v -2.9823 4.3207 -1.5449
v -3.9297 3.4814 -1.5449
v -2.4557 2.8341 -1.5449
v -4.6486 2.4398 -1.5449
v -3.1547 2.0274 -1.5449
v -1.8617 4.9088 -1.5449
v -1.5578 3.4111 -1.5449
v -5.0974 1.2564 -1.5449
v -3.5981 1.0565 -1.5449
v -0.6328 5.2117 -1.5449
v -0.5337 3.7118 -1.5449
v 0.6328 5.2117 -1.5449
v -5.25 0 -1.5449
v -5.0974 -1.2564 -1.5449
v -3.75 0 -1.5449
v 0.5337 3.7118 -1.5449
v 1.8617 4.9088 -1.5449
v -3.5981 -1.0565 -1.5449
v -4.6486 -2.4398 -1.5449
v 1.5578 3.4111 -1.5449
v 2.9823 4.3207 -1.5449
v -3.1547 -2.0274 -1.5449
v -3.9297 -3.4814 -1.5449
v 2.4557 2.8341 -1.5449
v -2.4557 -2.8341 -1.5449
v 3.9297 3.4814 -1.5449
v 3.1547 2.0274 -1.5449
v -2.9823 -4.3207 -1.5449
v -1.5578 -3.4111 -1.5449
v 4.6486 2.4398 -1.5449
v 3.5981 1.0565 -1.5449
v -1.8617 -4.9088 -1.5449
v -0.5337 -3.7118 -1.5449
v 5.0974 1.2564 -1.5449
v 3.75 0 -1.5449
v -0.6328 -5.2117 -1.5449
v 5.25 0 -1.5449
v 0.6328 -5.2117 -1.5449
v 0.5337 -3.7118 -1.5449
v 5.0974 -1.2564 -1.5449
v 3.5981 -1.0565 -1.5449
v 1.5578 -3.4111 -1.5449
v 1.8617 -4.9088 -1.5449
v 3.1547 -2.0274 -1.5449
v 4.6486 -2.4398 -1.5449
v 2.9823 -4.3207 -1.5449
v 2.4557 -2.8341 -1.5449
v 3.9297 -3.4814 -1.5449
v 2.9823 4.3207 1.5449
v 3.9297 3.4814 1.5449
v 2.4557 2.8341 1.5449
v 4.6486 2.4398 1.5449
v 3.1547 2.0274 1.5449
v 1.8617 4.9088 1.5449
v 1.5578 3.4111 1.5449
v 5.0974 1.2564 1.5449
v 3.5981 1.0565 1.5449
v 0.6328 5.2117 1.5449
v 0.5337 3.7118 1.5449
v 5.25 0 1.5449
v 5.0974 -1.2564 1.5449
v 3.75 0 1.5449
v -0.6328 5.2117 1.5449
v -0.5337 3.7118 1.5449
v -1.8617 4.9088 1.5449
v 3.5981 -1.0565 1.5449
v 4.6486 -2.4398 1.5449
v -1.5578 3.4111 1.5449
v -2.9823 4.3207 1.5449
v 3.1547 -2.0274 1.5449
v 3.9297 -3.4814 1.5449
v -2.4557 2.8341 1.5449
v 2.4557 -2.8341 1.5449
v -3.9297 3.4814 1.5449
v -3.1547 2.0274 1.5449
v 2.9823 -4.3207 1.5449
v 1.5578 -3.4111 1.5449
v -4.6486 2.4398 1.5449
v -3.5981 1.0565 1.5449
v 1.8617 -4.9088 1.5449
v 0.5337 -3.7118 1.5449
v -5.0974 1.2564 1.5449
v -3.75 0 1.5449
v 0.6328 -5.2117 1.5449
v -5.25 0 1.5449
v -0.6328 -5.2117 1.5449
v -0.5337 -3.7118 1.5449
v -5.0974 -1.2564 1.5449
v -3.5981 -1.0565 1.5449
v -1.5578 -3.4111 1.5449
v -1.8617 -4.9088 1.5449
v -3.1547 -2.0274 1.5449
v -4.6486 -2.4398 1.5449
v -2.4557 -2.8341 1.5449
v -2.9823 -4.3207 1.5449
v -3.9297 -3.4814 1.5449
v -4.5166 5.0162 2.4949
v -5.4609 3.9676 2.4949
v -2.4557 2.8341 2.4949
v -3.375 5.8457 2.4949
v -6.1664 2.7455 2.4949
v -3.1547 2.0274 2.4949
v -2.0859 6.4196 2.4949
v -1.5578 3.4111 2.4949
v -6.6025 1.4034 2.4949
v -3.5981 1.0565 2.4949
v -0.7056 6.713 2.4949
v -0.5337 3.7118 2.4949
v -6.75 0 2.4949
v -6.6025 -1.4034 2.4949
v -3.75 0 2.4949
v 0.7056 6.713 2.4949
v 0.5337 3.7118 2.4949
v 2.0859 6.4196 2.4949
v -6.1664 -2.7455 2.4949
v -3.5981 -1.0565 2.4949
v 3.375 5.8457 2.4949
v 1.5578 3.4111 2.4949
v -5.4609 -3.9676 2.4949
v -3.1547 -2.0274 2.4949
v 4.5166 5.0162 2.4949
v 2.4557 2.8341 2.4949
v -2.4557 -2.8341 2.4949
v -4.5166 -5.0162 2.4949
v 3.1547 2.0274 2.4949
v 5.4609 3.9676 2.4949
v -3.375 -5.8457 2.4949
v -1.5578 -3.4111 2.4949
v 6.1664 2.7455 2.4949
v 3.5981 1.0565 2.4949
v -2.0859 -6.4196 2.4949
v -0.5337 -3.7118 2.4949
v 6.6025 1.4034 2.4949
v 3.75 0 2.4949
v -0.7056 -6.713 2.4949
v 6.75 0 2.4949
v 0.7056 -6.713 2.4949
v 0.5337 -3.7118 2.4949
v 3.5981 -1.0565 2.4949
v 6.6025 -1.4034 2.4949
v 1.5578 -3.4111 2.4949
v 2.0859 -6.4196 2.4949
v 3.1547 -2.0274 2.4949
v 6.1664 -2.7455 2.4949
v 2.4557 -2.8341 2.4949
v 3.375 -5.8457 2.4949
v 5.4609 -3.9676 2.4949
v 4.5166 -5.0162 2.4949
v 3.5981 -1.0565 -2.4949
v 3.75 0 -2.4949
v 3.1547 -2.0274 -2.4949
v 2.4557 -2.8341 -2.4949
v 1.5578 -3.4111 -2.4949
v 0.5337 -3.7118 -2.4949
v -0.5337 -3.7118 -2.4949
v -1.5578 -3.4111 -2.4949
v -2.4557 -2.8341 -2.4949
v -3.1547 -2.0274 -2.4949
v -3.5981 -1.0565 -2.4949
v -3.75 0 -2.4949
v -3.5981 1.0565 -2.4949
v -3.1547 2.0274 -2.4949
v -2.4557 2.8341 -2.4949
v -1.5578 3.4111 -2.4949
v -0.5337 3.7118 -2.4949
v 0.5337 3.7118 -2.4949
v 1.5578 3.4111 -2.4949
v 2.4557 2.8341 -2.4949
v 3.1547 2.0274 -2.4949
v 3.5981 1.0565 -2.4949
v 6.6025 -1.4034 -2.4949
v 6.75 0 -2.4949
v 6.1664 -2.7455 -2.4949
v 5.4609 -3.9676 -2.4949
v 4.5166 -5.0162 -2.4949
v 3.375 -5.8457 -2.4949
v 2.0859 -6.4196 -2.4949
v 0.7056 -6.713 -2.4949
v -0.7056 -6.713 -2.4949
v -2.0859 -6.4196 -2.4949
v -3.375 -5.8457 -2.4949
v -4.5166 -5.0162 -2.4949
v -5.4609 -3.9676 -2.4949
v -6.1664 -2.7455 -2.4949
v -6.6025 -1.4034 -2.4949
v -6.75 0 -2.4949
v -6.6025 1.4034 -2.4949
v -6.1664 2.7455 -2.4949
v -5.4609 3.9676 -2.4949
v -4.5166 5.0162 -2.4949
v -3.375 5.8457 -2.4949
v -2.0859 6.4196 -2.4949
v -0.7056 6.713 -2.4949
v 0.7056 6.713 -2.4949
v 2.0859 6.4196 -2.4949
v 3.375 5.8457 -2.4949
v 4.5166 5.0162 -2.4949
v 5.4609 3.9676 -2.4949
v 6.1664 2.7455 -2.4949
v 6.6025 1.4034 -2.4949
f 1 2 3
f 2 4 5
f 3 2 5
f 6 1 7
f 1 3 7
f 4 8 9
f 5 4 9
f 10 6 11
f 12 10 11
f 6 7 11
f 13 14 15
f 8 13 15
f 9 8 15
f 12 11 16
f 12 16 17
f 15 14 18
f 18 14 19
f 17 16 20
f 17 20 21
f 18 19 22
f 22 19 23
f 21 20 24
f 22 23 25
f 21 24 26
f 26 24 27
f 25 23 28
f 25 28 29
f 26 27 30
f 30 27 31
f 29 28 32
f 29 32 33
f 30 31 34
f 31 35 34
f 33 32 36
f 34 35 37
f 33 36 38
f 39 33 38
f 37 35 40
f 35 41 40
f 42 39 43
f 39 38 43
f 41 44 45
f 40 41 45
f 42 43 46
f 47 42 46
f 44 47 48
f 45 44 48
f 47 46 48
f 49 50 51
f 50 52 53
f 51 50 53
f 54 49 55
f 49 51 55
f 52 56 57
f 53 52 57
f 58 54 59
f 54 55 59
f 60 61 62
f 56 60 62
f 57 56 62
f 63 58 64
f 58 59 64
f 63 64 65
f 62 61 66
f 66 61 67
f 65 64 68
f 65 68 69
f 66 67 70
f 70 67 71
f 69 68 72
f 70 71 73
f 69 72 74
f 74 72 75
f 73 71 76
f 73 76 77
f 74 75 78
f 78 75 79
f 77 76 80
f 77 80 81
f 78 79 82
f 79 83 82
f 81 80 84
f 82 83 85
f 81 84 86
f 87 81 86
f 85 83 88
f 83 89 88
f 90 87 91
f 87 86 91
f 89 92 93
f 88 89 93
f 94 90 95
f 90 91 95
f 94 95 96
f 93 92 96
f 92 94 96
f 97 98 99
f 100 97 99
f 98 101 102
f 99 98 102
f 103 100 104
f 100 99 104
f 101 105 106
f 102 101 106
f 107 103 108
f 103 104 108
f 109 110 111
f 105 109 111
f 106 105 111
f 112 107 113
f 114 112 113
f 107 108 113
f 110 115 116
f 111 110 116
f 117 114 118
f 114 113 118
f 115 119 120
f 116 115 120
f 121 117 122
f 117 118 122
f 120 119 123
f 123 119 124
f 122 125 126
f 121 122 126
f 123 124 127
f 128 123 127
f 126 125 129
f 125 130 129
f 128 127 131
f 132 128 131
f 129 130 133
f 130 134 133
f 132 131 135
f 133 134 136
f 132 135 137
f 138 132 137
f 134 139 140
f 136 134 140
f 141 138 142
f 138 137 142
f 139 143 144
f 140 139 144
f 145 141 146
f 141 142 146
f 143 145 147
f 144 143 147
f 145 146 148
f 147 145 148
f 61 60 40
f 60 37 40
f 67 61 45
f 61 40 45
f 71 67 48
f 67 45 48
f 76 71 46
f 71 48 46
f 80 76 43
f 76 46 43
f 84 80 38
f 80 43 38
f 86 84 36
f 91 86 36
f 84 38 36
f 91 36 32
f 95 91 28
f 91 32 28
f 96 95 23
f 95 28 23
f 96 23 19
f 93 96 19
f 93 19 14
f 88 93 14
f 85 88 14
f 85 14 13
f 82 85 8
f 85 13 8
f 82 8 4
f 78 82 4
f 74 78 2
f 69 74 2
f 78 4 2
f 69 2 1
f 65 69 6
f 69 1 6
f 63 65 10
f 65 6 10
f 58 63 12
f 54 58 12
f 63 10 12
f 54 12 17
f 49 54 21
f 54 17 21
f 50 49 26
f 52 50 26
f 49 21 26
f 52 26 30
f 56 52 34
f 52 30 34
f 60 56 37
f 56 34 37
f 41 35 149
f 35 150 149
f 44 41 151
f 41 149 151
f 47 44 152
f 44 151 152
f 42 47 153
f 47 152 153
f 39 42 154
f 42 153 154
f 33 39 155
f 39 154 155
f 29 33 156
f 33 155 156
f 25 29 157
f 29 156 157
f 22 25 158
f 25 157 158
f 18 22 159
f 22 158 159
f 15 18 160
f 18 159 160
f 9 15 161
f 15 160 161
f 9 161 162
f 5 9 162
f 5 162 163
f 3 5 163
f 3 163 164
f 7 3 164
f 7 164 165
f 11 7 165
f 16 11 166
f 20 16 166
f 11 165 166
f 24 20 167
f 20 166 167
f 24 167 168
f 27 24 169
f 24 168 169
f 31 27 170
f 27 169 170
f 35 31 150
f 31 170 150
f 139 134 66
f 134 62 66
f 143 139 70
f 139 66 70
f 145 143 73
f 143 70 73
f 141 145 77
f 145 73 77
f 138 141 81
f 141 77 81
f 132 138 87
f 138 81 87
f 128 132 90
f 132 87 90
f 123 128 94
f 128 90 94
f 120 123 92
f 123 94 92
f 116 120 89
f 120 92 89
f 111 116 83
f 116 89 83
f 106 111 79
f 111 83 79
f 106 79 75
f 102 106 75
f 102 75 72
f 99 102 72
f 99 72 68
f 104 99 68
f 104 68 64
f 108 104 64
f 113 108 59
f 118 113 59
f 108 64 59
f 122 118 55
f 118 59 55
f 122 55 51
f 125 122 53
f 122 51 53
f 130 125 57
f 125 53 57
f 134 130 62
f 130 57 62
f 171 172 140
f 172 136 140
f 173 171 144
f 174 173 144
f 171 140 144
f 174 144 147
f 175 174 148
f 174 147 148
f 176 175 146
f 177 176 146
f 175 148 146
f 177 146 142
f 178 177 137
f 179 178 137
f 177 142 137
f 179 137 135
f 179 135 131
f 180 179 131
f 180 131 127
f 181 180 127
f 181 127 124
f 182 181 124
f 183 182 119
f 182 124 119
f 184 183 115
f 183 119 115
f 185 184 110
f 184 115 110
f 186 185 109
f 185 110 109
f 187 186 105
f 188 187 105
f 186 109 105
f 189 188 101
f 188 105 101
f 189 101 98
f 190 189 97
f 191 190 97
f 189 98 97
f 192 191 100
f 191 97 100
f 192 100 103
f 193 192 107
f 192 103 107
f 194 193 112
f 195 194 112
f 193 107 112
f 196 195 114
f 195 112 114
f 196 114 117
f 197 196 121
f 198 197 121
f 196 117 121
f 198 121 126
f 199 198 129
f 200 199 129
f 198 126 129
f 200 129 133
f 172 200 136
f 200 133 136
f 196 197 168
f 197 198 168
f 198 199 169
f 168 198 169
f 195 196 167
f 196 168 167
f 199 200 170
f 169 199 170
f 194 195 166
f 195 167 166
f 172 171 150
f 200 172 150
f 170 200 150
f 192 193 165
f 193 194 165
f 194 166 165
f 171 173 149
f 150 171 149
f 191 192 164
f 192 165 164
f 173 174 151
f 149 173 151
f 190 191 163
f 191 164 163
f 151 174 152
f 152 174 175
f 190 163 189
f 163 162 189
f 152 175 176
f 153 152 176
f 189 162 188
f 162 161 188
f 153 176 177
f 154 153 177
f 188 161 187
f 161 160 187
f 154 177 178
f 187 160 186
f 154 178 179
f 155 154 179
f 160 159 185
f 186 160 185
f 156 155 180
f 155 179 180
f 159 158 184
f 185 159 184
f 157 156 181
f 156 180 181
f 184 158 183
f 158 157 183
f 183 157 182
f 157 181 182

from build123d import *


with BuildPart() as f1:
    # F0 (on Front) → F1 (revolve)
    with BuildSketch(Plane.XZ):
        Polygon((2.25, -1.5448883603), (2.25, -2.4948883603), (3.7, -2.4948883603), (3.7, -1.4948883603), (3.75, -1.4948883603), (5.2, -1.4948883603), (5.2, 1.4948883603), (3.75, 1.4948883603), (3.7, 1.4948883603), (3.7, 2.4948883603), (2.25, 2.4948883603), (2.25, 1.5448883603), (2.25, 1.4948883603), (2.25, -1.4948883603), align=None)
    revolve(axis=Axis((0, 0, 0), (0, 0, -1)))


with BuildPart() as f1b:
    # F0 (on Front) → F1, piece 2 (revolve)
    with BuildSketch(Plane.XZ):
        Polygon((3.75, -2.4948883603), (6.75, -2.4948883603), (6.75, 2.4948883603), (3.75, 2.4948883603), (3.75, 1.5448883603), (5.25, 1.5448883603), (5.25, -1.5448883603), (3.75, -1.5448883603), align=None)
    revolve(axis=Axis((0, 0, 0), (0, 0, -1)))


solid = f1b.part
